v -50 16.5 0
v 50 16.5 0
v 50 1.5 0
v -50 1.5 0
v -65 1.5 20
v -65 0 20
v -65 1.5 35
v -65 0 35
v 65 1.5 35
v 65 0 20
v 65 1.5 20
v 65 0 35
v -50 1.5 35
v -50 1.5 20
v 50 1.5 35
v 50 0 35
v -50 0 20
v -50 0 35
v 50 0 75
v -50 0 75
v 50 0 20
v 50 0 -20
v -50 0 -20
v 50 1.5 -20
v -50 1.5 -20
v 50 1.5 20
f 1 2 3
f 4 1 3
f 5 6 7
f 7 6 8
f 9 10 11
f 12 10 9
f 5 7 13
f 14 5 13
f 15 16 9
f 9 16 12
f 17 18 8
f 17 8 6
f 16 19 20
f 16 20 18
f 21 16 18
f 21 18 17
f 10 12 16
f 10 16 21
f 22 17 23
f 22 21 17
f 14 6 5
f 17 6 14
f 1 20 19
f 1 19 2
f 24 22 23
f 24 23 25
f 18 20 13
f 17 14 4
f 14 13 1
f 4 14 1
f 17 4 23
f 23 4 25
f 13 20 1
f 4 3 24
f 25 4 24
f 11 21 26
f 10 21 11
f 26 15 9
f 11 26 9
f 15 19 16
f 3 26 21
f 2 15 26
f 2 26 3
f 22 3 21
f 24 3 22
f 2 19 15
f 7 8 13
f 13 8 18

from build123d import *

# Parameters (mm, degrees)
BOSS_EXTRUDE1_DEPTH = 50
SKETCH2_W           = 20
SKETCH2_H           = 1.5
BOSS_EXTRUDE2_DEPTH = 100
SKETCH3_W           = 15
SKETCH3_H           = 15
BOSS_EXTRUDE3_DEPTH = 1.5


with BuildPart() as part:
    # Sketch1 → Boss-Extrude1 (new body, symmetric)
    with BuildSketch(Plane(origin=(0, 0, 0), x_dir=(0, 0, -1), z_dir=(1, 0, 0))):
        Polygon((-75, 0), (0, 16.5), (0, 0), align=None)
    extrude(amount=BOSS_EXTRUDE1_DEPTH, both=True)

    # Sketch2 → Boss-Extrude2 (add)
    with BuildSketch(Plane(origin=(50, 0, 0), x_dir=(0, 0, -1), z_dir=(1, 0, 0))):
        with Locations((10, 0.75)):
            Rectangle(SKETCH2_W, SKETCH2_H)
    extrude(amount=-BOSS_EXTRUDE2_DEPTH)

    # Sketch3 → Boss-Extrude3 (add)
    with BuildSketch(Plane.XZ):
        with Locations((57.5, 27.5)):
            Rectangle(SKETCH3_W, SKETCH3_H)
        with Locations((-57.5, 27.5)):
            Rectangle(SKETCH3_W, SKETCH3_H)
    extrude(amount=-BOSS_EXTRUDE3_DEPTH)


solid = part.part
